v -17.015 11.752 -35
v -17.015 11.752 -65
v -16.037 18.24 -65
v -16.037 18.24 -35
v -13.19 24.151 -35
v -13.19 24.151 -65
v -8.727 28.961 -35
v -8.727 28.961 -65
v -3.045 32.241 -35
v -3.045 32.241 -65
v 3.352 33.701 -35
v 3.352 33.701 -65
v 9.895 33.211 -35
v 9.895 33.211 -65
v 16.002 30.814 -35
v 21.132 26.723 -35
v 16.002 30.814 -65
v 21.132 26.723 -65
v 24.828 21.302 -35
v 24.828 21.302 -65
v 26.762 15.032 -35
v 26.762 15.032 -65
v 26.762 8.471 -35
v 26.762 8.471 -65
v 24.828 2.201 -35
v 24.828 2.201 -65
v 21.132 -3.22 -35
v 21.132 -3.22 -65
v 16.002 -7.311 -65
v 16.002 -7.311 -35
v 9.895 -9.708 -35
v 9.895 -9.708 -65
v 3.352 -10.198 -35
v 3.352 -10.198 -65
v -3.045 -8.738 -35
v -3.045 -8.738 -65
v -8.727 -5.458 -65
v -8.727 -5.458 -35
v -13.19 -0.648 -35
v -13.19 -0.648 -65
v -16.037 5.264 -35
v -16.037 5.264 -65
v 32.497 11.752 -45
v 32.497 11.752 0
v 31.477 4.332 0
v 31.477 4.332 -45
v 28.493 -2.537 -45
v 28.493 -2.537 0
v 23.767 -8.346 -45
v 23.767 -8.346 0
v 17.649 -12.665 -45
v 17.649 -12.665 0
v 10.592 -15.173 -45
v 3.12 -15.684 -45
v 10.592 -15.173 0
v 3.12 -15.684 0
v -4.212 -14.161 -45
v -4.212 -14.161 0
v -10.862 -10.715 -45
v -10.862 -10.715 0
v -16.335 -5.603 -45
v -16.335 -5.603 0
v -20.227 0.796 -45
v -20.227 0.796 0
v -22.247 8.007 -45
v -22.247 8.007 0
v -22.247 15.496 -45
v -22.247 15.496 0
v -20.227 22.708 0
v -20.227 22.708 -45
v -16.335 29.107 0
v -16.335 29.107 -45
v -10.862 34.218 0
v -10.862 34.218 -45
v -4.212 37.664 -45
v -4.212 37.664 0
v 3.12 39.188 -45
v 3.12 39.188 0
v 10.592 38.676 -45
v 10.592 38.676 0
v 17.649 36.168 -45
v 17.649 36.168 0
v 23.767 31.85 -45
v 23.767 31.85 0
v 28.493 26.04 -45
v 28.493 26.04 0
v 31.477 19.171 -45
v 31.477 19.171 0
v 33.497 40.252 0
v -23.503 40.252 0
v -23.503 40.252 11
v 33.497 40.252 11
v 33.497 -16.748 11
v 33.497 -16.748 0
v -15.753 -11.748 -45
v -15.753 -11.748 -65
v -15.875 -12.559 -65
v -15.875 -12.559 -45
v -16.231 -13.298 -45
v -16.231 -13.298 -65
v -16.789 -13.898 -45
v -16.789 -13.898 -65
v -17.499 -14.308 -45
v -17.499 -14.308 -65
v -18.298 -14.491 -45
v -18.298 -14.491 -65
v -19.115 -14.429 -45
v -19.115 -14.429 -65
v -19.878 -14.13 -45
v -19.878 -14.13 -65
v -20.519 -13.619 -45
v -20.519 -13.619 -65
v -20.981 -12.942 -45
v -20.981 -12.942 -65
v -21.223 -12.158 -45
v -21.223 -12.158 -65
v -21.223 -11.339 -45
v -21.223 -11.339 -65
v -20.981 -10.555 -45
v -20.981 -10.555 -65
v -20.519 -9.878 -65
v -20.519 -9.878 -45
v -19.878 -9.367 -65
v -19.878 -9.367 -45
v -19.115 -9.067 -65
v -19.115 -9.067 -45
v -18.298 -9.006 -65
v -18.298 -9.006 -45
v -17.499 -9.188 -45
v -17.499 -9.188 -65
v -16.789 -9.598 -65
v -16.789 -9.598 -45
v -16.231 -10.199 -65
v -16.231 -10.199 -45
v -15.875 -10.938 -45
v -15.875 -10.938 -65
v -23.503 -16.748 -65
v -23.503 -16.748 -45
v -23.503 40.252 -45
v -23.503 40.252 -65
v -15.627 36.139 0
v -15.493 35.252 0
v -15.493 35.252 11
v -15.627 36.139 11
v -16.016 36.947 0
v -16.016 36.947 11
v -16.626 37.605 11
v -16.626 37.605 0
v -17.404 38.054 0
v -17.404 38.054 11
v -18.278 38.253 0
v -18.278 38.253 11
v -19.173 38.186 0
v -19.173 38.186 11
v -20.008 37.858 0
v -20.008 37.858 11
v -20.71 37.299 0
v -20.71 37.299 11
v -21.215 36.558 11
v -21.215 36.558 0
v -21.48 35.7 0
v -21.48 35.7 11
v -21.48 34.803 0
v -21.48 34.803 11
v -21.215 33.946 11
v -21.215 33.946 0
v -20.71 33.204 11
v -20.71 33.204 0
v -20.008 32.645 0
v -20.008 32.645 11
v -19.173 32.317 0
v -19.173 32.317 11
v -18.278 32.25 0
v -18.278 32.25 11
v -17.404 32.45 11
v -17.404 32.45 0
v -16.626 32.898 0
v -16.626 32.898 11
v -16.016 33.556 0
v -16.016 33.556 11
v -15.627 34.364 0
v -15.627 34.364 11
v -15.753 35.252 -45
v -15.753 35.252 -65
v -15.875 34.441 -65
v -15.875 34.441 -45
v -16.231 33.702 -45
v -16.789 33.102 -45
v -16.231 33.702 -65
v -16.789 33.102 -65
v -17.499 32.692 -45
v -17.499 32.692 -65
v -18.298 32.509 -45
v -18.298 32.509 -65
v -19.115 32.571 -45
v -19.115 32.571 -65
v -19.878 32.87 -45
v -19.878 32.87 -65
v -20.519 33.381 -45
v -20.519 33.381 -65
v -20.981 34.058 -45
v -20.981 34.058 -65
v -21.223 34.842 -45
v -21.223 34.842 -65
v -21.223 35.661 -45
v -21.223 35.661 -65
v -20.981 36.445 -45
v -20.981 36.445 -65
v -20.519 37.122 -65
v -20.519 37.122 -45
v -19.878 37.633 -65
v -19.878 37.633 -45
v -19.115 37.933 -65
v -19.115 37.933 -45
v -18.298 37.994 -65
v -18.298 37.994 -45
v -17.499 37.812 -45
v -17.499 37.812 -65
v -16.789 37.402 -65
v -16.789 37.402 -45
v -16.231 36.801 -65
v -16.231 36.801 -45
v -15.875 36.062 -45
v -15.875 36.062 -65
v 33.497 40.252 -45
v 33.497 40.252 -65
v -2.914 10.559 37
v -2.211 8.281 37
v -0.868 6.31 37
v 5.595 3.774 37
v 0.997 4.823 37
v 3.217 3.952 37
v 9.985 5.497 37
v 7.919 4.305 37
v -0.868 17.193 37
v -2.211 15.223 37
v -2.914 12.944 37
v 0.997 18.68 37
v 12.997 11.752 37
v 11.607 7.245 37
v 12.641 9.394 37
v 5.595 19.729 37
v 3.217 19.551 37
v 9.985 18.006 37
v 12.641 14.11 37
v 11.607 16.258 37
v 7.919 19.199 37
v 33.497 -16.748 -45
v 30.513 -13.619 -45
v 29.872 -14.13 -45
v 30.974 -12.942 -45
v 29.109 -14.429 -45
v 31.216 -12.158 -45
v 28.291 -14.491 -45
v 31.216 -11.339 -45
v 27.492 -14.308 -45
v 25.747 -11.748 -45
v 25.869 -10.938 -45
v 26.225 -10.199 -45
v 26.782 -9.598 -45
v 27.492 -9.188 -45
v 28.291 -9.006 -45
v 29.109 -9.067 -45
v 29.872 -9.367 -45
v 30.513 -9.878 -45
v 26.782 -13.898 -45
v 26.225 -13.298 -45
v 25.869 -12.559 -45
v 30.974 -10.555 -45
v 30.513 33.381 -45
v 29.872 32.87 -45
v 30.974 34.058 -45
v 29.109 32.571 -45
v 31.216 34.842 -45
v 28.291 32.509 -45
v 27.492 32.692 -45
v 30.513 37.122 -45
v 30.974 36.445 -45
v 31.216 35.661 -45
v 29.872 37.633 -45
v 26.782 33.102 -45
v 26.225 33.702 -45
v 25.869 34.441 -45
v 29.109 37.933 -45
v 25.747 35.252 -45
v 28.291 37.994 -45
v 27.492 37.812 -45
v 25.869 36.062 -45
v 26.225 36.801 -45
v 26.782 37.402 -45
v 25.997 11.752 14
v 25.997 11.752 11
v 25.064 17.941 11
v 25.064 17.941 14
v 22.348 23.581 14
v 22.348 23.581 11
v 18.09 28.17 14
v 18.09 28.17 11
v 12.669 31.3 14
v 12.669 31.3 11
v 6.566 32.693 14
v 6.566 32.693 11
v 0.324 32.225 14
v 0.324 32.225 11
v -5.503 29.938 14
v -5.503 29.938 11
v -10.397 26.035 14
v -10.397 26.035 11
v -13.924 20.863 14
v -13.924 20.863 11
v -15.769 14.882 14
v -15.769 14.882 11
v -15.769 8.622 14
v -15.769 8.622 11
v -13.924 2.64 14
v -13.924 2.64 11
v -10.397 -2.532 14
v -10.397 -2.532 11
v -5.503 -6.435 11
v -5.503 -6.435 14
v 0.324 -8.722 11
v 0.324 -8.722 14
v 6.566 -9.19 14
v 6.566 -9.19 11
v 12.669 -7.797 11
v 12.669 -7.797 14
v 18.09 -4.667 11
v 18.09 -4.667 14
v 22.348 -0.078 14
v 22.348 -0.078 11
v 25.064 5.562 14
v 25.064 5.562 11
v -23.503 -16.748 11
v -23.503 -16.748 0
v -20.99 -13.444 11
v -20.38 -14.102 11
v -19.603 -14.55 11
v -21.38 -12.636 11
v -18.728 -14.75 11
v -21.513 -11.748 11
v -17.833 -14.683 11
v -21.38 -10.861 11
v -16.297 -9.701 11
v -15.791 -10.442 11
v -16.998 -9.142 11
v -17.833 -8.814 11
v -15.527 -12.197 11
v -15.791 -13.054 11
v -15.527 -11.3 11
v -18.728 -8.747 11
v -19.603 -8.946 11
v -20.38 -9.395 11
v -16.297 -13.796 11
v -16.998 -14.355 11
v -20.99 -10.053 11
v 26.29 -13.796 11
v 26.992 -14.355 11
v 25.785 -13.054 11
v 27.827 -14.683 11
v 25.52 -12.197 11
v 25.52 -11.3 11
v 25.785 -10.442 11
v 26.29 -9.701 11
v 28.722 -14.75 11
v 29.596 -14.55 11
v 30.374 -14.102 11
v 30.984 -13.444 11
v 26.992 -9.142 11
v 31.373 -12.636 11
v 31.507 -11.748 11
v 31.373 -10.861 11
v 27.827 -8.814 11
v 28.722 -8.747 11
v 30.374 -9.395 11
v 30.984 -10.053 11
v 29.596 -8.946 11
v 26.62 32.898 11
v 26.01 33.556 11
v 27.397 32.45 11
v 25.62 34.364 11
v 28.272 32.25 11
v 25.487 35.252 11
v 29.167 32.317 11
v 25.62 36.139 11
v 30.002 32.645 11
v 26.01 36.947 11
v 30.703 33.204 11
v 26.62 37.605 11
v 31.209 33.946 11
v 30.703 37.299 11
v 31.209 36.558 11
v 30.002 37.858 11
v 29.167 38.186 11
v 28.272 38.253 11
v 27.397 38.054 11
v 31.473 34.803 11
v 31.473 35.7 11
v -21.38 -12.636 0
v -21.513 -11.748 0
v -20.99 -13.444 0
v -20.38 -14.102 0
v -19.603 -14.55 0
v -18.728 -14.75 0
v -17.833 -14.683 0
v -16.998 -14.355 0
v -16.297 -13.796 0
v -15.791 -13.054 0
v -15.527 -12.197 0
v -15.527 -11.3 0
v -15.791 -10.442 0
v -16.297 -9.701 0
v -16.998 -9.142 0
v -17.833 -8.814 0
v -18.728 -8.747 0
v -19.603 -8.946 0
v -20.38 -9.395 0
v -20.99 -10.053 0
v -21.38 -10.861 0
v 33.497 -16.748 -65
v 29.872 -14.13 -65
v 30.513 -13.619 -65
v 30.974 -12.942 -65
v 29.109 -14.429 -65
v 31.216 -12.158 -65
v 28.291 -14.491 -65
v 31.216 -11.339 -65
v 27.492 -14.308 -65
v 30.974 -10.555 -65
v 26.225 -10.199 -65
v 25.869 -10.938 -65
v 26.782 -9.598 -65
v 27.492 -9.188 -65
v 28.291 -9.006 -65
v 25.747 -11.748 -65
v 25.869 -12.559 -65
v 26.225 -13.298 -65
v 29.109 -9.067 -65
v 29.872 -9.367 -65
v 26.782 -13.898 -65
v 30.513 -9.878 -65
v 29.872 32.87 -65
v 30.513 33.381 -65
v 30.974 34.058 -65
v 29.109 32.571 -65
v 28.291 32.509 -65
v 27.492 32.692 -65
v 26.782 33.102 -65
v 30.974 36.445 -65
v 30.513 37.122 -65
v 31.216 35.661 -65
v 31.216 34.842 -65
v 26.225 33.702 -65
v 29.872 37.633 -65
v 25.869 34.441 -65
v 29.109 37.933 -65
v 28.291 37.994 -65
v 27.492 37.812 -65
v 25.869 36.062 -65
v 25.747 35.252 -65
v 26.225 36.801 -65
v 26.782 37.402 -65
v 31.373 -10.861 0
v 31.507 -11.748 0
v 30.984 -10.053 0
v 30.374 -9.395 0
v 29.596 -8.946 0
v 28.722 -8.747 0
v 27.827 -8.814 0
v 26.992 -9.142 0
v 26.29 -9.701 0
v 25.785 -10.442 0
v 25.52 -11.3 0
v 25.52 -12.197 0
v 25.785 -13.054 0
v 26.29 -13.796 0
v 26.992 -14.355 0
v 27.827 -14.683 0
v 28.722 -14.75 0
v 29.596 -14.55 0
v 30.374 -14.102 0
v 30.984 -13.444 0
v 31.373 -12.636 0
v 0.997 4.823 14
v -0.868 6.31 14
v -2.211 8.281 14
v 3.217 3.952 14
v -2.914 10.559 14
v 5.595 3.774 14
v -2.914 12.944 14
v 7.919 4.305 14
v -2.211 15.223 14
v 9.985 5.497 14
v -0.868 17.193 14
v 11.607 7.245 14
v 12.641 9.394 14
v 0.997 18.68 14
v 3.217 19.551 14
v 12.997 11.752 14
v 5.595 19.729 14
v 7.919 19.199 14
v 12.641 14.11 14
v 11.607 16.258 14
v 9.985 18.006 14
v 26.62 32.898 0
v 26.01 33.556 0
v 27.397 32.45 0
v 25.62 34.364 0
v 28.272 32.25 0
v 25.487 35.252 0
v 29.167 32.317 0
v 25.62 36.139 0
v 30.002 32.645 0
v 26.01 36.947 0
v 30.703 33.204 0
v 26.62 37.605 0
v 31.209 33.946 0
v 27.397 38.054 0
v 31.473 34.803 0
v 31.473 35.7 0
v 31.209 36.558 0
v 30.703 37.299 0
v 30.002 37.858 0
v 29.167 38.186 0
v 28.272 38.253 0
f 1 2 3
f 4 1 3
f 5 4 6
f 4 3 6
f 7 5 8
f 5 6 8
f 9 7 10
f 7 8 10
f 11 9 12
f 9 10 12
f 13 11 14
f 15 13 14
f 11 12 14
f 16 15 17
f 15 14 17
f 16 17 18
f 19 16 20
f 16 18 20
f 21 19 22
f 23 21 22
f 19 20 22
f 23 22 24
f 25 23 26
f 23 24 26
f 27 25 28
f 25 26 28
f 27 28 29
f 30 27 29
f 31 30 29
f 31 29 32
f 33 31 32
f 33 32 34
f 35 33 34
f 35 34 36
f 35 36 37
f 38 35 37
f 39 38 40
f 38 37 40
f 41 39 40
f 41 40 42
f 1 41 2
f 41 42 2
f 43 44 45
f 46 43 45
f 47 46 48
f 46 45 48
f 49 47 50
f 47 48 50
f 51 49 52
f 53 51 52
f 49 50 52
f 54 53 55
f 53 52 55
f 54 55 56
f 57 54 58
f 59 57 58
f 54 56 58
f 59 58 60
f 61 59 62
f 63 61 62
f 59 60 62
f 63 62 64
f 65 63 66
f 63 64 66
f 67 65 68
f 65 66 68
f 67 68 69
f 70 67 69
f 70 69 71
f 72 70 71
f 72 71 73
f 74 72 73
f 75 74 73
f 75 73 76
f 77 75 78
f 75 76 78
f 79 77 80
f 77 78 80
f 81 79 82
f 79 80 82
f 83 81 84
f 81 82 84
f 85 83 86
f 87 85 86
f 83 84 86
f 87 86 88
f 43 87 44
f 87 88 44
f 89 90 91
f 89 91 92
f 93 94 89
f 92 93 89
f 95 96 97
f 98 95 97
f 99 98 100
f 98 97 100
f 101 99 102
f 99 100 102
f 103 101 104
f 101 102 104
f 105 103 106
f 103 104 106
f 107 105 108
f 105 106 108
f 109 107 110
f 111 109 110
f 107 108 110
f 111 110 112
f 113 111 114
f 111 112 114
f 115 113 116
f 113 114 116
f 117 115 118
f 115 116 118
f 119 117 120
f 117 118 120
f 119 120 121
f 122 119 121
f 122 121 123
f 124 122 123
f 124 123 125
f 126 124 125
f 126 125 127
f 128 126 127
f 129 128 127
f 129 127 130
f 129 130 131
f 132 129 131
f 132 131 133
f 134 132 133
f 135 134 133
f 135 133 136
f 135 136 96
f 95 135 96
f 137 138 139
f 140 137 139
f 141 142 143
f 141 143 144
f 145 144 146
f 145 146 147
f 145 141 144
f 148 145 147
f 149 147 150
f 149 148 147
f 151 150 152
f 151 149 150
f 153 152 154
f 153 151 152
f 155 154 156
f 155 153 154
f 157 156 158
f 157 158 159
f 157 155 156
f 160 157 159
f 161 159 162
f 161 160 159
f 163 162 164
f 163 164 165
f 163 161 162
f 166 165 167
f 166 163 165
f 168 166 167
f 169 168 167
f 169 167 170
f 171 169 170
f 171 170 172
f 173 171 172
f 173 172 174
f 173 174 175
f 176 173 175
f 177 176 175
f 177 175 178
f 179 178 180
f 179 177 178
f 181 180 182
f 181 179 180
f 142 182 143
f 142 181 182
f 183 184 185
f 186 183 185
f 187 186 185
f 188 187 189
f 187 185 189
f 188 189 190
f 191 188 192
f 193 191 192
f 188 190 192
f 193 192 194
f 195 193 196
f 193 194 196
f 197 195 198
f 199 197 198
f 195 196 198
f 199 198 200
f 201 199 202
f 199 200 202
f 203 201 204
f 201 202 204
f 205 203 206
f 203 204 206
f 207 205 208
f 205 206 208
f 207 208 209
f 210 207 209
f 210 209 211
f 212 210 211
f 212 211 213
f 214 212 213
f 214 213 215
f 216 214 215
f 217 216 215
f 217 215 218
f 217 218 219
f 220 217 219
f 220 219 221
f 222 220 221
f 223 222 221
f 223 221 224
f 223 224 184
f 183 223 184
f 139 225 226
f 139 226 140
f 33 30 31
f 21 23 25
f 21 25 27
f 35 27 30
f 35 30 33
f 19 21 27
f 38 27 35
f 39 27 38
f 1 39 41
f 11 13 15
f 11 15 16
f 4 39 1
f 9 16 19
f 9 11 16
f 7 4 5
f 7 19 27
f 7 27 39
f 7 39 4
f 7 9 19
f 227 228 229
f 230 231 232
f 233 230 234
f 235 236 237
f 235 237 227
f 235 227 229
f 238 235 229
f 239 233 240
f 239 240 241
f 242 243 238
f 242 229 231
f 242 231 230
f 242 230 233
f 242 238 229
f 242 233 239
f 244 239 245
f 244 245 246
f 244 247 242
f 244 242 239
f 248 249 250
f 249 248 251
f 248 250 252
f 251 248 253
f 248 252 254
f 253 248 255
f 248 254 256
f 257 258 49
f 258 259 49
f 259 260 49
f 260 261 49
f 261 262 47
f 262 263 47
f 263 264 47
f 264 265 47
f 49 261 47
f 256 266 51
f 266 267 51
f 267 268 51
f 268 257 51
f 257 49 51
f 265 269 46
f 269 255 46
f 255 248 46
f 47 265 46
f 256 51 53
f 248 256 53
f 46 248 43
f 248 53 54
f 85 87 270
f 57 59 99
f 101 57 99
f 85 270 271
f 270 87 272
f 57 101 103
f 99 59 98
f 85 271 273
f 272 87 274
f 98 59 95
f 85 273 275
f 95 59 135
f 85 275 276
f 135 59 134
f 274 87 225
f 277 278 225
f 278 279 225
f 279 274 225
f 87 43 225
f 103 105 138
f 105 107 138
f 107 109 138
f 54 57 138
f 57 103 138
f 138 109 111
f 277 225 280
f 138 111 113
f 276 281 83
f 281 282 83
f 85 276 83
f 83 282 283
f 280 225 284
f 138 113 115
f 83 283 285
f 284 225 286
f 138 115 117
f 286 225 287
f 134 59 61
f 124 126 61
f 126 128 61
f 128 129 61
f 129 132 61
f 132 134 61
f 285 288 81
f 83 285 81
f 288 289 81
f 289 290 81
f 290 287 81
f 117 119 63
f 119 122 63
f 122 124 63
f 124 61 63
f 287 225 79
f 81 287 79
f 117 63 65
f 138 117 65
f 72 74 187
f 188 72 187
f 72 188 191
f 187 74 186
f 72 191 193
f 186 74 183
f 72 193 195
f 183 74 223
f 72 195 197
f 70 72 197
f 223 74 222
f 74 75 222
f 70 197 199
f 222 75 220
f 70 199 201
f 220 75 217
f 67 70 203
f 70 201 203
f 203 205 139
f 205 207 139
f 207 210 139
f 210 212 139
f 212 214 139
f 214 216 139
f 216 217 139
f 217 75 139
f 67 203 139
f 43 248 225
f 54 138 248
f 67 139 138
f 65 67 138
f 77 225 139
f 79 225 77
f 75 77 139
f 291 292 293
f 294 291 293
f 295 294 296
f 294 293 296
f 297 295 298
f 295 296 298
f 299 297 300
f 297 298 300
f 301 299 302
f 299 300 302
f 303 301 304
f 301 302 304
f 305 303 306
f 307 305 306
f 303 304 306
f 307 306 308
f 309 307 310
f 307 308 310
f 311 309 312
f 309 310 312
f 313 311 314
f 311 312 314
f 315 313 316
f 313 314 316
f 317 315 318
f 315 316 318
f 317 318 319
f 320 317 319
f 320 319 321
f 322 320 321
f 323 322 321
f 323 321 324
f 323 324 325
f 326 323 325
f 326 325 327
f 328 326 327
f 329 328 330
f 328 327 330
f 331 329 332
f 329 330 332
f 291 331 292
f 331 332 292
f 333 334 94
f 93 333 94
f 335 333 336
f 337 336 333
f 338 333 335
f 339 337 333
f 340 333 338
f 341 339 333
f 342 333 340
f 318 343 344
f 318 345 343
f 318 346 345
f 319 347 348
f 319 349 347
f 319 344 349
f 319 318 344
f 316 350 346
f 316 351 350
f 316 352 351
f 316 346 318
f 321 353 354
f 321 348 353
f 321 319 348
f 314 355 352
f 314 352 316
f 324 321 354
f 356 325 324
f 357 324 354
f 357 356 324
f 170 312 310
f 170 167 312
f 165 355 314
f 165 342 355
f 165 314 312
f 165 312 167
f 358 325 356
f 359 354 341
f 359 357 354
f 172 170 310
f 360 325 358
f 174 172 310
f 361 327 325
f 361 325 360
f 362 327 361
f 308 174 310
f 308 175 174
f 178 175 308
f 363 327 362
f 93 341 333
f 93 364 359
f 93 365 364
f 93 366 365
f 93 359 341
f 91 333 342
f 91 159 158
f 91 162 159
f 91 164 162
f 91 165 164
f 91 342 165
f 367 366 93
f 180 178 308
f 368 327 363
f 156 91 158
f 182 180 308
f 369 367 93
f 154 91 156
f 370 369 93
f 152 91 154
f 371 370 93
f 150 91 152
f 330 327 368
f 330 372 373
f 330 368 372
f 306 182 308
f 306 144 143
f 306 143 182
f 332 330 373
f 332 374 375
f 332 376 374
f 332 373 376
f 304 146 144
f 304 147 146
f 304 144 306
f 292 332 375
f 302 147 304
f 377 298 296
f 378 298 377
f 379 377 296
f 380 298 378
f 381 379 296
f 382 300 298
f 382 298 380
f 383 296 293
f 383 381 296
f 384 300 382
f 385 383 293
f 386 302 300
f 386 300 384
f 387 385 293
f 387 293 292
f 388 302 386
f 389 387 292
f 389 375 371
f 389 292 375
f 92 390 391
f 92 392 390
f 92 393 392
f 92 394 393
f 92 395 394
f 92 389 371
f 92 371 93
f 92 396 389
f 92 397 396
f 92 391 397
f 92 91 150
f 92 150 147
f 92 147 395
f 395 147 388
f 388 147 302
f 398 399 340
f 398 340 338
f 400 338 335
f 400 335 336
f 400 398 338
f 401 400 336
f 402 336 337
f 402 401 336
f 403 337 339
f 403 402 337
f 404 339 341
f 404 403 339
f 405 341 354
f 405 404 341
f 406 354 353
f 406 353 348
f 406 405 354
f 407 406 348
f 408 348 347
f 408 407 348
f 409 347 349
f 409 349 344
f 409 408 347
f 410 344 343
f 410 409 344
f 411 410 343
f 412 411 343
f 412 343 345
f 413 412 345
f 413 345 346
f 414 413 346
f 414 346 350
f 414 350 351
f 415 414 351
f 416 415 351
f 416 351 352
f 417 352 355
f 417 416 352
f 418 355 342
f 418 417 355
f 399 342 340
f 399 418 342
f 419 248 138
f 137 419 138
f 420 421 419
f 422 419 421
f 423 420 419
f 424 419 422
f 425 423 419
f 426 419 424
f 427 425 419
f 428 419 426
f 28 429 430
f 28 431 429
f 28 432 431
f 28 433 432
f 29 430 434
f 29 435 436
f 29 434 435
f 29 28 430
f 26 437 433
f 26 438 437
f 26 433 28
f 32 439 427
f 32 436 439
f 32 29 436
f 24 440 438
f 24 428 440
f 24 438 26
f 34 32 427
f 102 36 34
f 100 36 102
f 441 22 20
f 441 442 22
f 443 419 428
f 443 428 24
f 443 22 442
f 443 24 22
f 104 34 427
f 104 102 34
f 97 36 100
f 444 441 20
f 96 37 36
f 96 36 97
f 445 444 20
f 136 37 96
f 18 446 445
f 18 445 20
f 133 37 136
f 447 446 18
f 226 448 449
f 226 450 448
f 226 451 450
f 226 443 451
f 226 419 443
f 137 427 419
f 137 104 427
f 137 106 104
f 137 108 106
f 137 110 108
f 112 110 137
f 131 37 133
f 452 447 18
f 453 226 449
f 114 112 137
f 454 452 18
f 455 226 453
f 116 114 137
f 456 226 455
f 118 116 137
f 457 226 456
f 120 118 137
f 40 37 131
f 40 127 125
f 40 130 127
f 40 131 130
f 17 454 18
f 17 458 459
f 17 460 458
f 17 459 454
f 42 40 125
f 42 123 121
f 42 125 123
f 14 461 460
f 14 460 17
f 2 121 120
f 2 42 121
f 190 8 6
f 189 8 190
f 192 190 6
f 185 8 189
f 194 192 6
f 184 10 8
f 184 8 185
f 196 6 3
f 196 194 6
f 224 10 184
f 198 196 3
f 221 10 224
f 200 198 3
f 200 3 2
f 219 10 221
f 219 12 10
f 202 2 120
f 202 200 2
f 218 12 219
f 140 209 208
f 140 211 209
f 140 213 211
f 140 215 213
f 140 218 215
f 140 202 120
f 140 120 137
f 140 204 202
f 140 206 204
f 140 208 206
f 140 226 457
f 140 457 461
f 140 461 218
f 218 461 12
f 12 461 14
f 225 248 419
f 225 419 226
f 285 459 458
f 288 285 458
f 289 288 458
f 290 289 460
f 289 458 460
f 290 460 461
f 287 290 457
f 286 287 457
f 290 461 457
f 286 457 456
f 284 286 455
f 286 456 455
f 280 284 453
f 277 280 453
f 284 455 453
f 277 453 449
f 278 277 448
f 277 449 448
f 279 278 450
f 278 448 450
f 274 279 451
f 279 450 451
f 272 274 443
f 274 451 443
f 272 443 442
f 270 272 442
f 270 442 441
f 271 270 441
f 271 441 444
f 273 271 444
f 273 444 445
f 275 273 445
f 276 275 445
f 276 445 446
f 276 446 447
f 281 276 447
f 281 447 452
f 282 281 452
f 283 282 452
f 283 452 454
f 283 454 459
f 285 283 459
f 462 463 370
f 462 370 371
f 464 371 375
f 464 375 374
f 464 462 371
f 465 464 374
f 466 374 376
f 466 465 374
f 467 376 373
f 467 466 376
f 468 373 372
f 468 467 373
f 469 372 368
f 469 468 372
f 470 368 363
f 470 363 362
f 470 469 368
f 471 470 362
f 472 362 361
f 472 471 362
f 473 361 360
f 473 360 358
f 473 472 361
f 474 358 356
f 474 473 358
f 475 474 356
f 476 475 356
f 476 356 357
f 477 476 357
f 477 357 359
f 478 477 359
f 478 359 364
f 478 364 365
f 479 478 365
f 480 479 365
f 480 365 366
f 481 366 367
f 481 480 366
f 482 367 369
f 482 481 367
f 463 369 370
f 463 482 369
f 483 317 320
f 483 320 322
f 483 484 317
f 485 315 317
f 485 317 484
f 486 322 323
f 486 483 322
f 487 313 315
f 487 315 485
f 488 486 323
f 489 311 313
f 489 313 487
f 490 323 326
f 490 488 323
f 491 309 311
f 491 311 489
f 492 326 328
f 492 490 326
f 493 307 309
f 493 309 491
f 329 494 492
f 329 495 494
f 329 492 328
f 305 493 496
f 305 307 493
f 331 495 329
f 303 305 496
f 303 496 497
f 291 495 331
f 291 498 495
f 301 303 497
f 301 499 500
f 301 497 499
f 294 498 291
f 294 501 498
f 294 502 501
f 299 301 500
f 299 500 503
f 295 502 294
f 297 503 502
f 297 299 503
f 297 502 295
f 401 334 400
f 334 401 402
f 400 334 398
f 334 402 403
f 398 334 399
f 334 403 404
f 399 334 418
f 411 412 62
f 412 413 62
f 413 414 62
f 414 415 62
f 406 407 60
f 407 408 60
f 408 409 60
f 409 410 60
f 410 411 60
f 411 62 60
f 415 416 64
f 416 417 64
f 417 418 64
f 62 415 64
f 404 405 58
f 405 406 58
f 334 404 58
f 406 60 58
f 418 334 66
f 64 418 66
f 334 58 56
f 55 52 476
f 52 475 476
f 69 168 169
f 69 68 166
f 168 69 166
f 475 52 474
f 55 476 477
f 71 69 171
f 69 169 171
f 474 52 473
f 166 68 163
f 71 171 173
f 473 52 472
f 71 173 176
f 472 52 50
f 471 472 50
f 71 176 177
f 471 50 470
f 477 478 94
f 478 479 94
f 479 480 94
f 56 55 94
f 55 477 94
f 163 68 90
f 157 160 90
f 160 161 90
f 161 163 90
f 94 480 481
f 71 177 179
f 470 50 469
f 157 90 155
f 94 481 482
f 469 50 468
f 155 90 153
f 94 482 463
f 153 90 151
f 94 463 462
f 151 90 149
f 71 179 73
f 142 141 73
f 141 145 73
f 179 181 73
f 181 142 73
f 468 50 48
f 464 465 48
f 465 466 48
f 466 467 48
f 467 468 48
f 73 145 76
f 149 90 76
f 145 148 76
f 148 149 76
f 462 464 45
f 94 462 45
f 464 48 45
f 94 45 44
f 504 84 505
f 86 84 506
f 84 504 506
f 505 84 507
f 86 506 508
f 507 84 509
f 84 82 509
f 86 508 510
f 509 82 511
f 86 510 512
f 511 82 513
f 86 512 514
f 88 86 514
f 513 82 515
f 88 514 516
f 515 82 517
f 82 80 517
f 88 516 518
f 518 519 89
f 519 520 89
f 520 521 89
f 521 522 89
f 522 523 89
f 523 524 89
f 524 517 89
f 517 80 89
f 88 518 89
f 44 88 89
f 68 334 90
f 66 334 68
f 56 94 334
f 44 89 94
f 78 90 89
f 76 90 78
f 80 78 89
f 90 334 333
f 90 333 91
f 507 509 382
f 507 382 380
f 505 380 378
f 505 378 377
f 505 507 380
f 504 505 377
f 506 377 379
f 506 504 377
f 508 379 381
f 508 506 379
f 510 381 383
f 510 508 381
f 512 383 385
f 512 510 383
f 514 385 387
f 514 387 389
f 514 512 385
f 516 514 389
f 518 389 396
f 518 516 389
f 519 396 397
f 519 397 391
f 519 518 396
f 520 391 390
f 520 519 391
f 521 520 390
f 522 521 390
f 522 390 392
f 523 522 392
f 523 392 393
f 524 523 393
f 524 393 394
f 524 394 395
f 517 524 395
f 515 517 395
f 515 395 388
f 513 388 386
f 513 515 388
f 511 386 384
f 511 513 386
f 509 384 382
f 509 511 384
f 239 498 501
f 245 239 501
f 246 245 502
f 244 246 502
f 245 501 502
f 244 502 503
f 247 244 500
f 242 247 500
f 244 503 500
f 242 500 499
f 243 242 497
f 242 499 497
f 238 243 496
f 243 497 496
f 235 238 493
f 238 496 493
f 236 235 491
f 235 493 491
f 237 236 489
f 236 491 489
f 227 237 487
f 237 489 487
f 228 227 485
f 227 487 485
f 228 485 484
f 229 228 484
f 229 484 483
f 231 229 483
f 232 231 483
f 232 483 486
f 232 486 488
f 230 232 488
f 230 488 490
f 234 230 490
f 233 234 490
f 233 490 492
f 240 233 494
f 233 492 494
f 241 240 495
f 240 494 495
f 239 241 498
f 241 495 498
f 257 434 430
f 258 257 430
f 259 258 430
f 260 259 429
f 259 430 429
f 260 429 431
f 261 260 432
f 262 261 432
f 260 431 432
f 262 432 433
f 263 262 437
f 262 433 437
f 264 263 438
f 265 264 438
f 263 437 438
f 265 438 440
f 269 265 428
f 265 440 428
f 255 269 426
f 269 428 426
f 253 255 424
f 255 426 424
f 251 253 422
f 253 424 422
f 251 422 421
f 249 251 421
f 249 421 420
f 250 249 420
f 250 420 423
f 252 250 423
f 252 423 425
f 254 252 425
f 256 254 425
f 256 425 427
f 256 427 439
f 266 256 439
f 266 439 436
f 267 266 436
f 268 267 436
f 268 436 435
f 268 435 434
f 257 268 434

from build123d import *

# Parameters (mm, degrees)
SKETCH_1_W          = 57
SKETCH_1_H          = 57
SKETCH_1_R          = 3.010136902
EXTRUDE_1_DEPTH     = 11
SKETCH_2_R          = 21
EXTRUDE_2_DEPTH     = 3
SKETCH_3_R          = 8
EXTRUDE_3_DEPTH     = 23
SKETCH_4_R          = 27.5
EXTRUDE_4_DEPTH     = 45
SKETCH_5_W          = 57
SKETCH_5_H          = 57
EXTRUDE_5_DEPTH     = 20
SKETCH_6_R          = 2.75
CUT_EXTRUDE_1_DEPTH = 115.656991337
SKETCH_7_R          = 22.011376544
CUT_EXTRUDE_2_DEPTH = 30


with BuildPart() as part:
    # 草图1 → 凸台-拉伸1 (new body)
    with BuildSketch(Plane.XY):
        with Locations((4.996753247, 11.751623377)):
            Rectangle(SKETCH_1_W, SKETCH_1_H)
        with Locations((-18.503246753, 35.251623377)):
            Circle(SKETCH_1_R, mode=Mode.SUBTRACT)
        with Locations(Location((28.496753247, 35.251623377, 0), (0, 0, 180))):
            Circle(SKETCH_1_R, mode=Mode.SUBTRACT)
        with Locations(Location((-18.503246753, -11.748376623, 0), (0, 0, 180))):
            Circle(SKETCH_1_R, mode=Mode.SUBTRACT)
        with Locations((28.496753247, -11.748376623)):
            Circle(SKETCH_1_R, mode=Mode.SUBTRACT)
    extrude(amount=EXTRUDE_1_DEPTH)

    # 草图2 → 凸台-拉伸2 (add)
    with BuildSketch(Plane.XY.offset(11)):
        with Locations((4.996753247, 11.751623377)):
            Circle(SKETCH_2_R)
    extrude(amount=EXTRUDE_2_DEPTH)

    # 草图3 → 凸台-拉伸3 (add)
    with BuildSketch(Plane.XY.offset(14)):
        with Locations((4.996753247, 11.751623377)):
            Circle(SKETCH_3_R)
    extrude(amount=EXTRUDE_3_DEPTH)

    # 草图4 → 凸台-拉伸4 (add)
    with BuildSketch(Plane(origin=(0, 0, 0), x_dir=(-1, 0, 0), z_dir=(0, 0, -1))):
        with Locations(Location((-4.996753247, 11.751623377, 0), (0, 0, 180))):
            Circle(SKETCH_4_R)
    extrude(amount=EXTRUDE_4_DEPTH)

    # 草图5 → 凸台-拉伸5 (add)
    with BuildSketch(Plane(origin=(0, 0, -45), x_dir=(-1, 0, 0), z_dir=(0, 0, -1))):
        with Locations((-4.996753247, 11.751623377)):
            Rectangle(SKETCH_5_W, SKETCH_5_H)
    extrude(amount=EXTRUDE_5_DEPTH)

    # 草图6 → 切除-拉伸1 (cut, through all)
    with BuildSketch(Plane(origin=(0, 0, -65), x_dir=(-1, 0, 0), z_dir=(0, 0, -1))):
        with Locations((-28.496753247, 35.251623377)):
            Circle(SKETCH_6_R)
        with Locations(Location((18.503246753, 35.251623377, 0), (0, 0, 180))):
            Circle(SKETCH_6_R)
        with Locations(Location((18.503246753, -11.748376623, 0), (0, 0, 180))):
            Circle(SKETCH_6_R)
        with Locations((-28.496753247, -11.748376623)):
            Circle(SKETCH_6_R)
    extrude(amount=-CUT_EXTRUDE_1_DEPTH, mode=Mode.SUBTRACT)

    # 草图7 → 切除-拉伸2 (cut)
    with BuildSketch(Plane(origin=(0, 0, -65), x_dir=(-1, 0, 0), z_dir=(0, 0, -1))):
        with Locations((-4.996753247, 11.751623377)):
            Circle(SKETCH_7_R)
    extrude(amount=-CUT_EXTRUDE_2_DEPTH, mode=Mode.SUBTRACT)


solid = part.part
